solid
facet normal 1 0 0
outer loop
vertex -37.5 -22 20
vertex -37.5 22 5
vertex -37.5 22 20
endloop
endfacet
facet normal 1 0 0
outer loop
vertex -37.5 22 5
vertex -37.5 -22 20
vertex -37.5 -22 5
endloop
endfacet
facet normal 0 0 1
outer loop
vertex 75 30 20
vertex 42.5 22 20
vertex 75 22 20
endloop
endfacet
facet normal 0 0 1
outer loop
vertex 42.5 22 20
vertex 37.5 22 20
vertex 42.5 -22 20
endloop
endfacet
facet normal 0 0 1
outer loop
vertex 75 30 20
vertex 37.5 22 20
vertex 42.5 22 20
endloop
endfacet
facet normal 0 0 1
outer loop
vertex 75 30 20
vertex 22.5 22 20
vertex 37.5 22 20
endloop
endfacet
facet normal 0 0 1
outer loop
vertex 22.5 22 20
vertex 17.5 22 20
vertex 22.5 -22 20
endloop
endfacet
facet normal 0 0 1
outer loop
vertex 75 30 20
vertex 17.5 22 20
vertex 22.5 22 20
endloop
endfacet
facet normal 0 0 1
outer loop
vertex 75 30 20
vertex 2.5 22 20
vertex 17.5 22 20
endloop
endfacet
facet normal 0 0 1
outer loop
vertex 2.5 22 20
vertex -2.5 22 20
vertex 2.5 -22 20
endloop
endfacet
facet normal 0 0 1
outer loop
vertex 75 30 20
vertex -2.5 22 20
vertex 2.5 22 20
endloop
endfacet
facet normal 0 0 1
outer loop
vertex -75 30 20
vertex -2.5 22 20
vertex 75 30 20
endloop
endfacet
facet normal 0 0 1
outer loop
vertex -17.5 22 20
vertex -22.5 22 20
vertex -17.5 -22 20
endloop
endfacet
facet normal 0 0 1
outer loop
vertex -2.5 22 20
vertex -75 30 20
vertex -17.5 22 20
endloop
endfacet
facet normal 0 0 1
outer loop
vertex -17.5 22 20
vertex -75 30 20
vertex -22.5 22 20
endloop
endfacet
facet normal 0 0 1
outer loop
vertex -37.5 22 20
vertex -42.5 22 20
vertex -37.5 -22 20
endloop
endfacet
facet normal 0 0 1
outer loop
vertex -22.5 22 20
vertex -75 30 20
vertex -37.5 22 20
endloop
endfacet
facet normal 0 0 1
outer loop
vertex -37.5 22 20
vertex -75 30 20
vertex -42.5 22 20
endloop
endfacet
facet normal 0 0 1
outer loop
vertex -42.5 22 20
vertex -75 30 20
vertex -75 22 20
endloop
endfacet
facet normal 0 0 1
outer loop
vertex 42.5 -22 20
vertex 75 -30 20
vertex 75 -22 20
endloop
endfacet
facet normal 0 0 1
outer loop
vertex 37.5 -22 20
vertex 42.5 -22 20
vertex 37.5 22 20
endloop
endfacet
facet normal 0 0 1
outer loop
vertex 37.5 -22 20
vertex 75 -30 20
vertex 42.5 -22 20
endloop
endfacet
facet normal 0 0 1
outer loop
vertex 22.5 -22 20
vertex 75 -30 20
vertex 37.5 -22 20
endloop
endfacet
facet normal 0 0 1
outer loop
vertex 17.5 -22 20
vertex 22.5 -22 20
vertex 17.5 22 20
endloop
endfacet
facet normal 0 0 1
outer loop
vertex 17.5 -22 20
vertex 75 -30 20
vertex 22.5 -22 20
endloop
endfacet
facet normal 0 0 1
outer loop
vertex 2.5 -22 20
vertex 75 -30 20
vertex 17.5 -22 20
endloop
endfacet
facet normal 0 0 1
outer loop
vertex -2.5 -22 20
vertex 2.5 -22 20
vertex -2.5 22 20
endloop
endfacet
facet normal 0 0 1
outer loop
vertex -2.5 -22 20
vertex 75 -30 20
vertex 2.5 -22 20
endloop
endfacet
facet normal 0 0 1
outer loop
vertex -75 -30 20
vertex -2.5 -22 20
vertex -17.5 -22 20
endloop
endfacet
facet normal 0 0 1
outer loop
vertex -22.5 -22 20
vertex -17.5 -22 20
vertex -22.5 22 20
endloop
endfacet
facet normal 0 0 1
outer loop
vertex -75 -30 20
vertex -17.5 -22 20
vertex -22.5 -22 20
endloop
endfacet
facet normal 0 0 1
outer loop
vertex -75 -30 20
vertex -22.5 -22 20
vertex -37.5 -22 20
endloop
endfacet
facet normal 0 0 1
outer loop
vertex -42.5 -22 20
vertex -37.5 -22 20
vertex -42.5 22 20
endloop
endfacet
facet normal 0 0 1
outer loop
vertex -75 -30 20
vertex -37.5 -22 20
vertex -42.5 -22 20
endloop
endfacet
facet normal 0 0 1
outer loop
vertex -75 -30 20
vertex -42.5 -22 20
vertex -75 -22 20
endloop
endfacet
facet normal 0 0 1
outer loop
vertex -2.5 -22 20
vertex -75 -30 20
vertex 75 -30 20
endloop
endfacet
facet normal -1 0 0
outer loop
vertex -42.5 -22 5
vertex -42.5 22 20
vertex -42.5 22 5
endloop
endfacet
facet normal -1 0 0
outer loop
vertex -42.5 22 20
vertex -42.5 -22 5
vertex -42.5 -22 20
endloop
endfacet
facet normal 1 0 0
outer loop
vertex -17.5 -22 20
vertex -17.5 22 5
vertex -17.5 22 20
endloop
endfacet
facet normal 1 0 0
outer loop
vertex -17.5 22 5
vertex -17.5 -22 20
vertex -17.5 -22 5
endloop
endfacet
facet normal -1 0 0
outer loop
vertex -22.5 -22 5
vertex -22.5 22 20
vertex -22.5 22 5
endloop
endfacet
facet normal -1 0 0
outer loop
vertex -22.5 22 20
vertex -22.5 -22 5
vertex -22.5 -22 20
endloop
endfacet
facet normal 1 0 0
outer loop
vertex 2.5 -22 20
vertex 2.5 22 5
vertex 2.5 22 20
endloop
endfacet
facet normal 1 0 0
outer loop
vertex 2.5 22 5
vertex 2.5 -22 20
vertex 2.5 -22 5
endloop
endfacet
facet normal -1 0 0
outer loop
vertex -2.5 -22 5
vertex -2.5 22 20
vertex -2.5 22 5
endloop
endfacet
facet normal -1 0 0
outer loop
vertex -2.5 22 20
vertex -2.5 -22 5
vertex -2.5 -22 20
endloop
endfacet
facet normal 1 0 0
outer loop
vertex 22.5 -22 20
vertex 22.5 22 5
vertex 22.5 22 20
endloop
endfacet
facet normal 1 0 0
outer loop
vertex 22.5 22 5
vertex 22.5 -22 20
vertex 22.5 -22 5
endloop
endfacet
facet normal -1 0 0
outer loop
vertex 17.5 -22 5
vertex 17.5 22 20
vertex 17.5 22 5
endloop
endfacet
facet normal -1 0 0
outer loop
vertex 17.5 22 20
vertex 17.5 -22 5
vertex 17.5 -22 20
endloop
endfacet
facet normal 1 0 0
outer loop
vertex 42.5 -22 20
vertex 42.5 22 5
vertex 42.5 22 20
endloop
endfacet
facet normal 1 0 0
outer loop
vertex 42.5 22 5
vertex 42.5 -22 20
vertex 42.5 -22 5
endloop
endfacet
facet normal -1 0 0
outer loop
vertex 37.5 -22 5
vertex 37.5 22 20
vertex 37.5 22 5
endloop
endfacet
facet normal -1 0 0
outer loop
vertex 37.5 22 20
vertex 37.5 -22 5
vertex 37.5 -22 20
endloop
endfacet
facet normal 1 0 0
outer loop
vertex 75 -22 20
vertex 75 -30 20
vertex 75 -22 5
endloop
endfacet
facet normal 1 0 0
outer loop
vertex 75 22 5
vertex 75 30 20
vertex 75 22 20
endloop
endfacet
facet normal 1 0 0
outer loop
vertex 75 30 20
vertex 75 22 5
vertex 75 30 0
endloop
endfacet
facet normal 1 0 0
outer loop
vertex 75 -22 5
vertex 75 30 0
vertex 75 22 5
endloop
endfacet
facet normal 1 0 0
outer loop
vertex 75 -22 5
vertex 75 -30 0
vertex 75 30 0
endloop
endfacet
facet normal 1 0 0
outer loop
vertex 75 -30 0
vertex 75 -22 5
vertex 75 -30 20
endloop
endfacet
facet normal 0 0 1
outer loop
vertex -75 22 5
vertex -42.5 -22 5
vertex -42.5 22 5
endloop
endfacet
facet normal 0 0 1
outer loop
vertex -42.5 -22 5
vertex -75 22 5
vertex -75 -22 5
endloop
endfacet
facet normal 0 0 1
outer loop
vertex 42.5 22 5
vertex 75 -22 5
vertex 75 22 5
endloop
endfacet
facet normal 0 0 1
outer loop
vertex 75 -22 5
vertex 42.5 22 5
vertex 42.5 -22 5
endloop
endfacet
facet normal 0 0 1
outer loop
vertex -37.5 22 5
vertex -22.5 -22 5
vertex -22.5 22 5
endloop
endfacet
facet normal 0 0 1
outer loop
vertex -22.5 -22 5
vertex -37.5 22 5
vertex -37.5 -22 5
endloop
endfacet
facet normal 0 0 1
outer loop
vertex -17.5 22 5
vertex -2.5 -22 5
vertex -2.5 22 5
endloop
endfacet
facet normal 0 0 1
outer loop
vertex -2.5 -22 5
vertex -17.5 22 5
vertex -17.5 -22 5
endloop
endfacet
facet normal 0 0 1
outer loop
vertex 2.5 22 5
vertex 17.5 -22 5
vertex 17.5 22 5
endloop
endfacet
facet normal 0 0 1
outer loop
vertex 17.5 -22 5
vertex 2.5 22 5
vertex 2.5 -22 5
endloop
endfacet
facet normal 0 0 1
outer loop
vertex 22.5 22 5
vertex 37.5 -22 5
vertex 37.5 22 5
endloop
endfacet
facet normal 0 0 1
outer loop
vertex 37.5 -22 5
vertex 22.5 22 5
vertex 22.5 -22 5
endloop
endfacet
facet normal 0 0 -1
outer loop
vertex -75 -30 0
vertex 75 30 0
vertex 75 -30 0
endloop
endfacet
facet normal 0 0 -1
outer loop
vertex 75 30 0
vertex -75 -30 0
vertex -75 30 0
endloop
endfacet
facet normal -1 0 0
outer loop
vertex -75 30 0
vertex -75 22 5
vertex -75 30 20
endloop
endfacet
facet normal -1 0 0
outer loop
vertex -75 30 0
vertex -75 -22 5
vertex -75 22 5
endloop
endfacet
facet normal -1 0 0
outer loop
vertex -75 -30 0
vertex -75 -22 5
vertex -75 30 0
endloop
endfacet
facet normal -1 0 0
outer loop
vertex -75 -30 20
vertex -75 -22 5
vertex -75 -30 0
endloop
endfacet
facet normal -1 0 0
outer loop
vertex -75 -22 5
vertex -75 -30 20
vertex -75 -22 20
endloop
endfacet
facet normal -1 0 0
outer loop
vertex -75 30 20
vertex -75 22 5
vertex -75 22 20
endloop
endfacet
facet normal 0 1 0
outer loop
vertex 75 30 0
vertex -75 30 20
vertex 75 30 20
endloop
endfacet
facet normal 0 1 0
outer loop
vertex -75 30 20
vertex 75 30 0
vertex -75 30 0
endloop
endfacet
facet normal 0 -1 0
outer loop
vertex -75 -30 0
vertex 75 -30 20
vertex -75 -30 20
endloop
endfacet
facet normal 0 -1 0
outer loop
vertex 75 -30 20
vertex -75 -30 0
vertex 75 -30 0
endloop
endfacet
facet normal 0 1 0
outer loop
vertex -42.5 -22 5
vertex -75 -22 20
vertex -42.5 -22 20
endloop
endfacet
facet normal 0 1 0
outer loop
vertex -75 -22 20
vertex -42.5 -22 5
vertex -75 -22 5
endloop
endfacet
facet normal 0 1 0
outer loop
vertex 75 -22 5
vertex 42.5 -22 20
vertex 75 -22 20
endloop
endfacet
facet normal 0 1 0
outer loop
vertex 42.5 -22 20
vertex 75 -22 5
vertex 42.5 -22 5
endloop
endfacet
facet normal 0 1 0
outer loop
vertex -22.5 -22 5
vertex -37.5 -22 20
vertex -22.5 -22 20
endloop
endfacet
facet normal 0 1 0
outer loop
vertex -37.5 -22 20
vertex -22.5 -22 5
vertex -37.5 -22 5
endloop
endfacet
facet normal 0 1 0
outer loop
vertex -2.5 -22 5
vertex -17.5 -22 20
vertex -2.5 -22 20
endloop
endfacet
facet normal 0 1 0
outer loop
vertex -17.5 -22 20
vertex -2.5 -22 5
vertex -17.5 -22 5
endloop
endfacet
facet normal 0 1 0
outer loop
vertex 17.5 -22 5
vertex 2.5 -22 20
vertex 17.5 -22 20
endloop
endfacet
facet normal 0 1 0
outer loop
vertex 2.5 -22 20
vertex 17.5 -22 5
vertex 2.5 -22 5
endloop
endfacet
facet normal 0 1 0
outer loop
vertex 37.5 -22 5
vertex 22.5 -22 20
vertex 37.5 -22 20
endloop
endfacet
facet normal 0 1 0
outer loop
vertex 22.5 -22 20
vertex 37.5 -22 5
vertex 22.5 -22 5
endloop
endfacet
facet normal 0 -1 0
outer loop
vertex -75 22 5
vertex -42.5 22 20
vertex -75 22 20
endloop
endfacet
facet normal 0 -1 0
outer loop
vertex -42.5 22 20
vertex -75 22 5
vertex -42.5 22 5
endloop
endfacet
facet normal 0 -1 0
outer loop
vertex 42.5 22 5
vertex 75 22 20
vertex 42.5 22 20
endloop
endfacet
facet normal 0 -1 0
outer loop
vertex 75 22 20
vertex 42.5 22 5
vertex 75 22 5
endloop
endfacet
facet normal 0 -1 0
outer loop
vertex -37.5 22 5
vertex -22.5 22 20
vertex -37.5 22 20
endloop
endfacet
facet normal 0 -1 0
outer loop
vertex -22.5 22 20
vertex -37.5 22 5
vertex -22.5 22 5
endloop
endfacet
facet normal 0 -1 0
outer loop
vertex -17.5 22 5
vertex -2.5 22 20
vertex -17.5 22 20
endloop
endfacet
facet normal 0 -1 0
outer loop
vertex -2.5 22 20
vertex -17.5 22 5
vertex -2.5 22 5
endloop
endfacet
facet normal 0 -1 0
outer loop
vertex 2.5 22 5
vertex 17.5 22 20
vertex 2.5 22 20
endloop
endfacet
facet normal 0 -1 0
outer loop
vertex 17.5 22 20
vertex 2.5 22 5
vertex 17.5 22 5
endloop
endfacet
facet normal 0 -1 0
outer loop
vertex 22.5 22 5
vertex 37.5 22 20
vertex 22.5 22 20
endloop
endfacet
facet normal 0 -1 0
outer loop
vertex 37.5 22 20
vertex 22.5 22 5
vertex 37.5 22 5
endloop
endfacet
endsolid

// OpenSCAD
$fn = 32;

// ----------------------------------------------------------------------
// Rib frame 150 x 60 x 20
// 5 ribs at 20 mm pitch
// ----------------------------------------------------------------------

// --- parameters (mm) ---
frame = [150, 60, 5];  // base plate size (x, y, z)
rail_w = 8;            // side rail width
ribs = 5;              // number of ribs
rib_t = 5;             // rib thickness
rib_h = 15;            // rib height above the base plate
pitch = 20;            // pitch between rib centres

// --- derived feature positions (mm) ---
span = (ribs - 1) * pitch;          // = 80   distance between the outer ribs
origin_x = -span / 2;               // = -40   X of the first rib
rib_len = frame[1] - 2 * rail_w + 2;  // = 46   rib length, 1 mm into each rail
feature_centers = [
  [origin_x + 0 * pitch, 0],
  [origin_x + 1 * pitch, 0],
  [origin_x + 2 * pitch, 0],
  [origin_x + 3 * pitch, 0],
  [origin_x + 4 * pitch, 0]
];   // rib centre line, drives the rib loop

// base plate, two side rails, then the ribs read straight off feature_centers
union() {
  translate([-frame[0] / 2, -frame[1] / 2, 0]) cube(frame);
  translate([-frame[0] / 2, -frame[1] / 2, 0]) cube([frame[0], rail_w, frame[2] + rib_h]);
  translate([-frame[0] / 2, frame[1] / 2 - rail_w, 0]) cube([frame[0], rail_w, frame[2] + rib_h]);
  for (centre = feature_centers)
    translate([centre[0] - rib_t / 2, centre[1] - rib_len / 2, frame[2] - 1])
      cube([rib_t, rib_len, rib_h + 1]);
}
